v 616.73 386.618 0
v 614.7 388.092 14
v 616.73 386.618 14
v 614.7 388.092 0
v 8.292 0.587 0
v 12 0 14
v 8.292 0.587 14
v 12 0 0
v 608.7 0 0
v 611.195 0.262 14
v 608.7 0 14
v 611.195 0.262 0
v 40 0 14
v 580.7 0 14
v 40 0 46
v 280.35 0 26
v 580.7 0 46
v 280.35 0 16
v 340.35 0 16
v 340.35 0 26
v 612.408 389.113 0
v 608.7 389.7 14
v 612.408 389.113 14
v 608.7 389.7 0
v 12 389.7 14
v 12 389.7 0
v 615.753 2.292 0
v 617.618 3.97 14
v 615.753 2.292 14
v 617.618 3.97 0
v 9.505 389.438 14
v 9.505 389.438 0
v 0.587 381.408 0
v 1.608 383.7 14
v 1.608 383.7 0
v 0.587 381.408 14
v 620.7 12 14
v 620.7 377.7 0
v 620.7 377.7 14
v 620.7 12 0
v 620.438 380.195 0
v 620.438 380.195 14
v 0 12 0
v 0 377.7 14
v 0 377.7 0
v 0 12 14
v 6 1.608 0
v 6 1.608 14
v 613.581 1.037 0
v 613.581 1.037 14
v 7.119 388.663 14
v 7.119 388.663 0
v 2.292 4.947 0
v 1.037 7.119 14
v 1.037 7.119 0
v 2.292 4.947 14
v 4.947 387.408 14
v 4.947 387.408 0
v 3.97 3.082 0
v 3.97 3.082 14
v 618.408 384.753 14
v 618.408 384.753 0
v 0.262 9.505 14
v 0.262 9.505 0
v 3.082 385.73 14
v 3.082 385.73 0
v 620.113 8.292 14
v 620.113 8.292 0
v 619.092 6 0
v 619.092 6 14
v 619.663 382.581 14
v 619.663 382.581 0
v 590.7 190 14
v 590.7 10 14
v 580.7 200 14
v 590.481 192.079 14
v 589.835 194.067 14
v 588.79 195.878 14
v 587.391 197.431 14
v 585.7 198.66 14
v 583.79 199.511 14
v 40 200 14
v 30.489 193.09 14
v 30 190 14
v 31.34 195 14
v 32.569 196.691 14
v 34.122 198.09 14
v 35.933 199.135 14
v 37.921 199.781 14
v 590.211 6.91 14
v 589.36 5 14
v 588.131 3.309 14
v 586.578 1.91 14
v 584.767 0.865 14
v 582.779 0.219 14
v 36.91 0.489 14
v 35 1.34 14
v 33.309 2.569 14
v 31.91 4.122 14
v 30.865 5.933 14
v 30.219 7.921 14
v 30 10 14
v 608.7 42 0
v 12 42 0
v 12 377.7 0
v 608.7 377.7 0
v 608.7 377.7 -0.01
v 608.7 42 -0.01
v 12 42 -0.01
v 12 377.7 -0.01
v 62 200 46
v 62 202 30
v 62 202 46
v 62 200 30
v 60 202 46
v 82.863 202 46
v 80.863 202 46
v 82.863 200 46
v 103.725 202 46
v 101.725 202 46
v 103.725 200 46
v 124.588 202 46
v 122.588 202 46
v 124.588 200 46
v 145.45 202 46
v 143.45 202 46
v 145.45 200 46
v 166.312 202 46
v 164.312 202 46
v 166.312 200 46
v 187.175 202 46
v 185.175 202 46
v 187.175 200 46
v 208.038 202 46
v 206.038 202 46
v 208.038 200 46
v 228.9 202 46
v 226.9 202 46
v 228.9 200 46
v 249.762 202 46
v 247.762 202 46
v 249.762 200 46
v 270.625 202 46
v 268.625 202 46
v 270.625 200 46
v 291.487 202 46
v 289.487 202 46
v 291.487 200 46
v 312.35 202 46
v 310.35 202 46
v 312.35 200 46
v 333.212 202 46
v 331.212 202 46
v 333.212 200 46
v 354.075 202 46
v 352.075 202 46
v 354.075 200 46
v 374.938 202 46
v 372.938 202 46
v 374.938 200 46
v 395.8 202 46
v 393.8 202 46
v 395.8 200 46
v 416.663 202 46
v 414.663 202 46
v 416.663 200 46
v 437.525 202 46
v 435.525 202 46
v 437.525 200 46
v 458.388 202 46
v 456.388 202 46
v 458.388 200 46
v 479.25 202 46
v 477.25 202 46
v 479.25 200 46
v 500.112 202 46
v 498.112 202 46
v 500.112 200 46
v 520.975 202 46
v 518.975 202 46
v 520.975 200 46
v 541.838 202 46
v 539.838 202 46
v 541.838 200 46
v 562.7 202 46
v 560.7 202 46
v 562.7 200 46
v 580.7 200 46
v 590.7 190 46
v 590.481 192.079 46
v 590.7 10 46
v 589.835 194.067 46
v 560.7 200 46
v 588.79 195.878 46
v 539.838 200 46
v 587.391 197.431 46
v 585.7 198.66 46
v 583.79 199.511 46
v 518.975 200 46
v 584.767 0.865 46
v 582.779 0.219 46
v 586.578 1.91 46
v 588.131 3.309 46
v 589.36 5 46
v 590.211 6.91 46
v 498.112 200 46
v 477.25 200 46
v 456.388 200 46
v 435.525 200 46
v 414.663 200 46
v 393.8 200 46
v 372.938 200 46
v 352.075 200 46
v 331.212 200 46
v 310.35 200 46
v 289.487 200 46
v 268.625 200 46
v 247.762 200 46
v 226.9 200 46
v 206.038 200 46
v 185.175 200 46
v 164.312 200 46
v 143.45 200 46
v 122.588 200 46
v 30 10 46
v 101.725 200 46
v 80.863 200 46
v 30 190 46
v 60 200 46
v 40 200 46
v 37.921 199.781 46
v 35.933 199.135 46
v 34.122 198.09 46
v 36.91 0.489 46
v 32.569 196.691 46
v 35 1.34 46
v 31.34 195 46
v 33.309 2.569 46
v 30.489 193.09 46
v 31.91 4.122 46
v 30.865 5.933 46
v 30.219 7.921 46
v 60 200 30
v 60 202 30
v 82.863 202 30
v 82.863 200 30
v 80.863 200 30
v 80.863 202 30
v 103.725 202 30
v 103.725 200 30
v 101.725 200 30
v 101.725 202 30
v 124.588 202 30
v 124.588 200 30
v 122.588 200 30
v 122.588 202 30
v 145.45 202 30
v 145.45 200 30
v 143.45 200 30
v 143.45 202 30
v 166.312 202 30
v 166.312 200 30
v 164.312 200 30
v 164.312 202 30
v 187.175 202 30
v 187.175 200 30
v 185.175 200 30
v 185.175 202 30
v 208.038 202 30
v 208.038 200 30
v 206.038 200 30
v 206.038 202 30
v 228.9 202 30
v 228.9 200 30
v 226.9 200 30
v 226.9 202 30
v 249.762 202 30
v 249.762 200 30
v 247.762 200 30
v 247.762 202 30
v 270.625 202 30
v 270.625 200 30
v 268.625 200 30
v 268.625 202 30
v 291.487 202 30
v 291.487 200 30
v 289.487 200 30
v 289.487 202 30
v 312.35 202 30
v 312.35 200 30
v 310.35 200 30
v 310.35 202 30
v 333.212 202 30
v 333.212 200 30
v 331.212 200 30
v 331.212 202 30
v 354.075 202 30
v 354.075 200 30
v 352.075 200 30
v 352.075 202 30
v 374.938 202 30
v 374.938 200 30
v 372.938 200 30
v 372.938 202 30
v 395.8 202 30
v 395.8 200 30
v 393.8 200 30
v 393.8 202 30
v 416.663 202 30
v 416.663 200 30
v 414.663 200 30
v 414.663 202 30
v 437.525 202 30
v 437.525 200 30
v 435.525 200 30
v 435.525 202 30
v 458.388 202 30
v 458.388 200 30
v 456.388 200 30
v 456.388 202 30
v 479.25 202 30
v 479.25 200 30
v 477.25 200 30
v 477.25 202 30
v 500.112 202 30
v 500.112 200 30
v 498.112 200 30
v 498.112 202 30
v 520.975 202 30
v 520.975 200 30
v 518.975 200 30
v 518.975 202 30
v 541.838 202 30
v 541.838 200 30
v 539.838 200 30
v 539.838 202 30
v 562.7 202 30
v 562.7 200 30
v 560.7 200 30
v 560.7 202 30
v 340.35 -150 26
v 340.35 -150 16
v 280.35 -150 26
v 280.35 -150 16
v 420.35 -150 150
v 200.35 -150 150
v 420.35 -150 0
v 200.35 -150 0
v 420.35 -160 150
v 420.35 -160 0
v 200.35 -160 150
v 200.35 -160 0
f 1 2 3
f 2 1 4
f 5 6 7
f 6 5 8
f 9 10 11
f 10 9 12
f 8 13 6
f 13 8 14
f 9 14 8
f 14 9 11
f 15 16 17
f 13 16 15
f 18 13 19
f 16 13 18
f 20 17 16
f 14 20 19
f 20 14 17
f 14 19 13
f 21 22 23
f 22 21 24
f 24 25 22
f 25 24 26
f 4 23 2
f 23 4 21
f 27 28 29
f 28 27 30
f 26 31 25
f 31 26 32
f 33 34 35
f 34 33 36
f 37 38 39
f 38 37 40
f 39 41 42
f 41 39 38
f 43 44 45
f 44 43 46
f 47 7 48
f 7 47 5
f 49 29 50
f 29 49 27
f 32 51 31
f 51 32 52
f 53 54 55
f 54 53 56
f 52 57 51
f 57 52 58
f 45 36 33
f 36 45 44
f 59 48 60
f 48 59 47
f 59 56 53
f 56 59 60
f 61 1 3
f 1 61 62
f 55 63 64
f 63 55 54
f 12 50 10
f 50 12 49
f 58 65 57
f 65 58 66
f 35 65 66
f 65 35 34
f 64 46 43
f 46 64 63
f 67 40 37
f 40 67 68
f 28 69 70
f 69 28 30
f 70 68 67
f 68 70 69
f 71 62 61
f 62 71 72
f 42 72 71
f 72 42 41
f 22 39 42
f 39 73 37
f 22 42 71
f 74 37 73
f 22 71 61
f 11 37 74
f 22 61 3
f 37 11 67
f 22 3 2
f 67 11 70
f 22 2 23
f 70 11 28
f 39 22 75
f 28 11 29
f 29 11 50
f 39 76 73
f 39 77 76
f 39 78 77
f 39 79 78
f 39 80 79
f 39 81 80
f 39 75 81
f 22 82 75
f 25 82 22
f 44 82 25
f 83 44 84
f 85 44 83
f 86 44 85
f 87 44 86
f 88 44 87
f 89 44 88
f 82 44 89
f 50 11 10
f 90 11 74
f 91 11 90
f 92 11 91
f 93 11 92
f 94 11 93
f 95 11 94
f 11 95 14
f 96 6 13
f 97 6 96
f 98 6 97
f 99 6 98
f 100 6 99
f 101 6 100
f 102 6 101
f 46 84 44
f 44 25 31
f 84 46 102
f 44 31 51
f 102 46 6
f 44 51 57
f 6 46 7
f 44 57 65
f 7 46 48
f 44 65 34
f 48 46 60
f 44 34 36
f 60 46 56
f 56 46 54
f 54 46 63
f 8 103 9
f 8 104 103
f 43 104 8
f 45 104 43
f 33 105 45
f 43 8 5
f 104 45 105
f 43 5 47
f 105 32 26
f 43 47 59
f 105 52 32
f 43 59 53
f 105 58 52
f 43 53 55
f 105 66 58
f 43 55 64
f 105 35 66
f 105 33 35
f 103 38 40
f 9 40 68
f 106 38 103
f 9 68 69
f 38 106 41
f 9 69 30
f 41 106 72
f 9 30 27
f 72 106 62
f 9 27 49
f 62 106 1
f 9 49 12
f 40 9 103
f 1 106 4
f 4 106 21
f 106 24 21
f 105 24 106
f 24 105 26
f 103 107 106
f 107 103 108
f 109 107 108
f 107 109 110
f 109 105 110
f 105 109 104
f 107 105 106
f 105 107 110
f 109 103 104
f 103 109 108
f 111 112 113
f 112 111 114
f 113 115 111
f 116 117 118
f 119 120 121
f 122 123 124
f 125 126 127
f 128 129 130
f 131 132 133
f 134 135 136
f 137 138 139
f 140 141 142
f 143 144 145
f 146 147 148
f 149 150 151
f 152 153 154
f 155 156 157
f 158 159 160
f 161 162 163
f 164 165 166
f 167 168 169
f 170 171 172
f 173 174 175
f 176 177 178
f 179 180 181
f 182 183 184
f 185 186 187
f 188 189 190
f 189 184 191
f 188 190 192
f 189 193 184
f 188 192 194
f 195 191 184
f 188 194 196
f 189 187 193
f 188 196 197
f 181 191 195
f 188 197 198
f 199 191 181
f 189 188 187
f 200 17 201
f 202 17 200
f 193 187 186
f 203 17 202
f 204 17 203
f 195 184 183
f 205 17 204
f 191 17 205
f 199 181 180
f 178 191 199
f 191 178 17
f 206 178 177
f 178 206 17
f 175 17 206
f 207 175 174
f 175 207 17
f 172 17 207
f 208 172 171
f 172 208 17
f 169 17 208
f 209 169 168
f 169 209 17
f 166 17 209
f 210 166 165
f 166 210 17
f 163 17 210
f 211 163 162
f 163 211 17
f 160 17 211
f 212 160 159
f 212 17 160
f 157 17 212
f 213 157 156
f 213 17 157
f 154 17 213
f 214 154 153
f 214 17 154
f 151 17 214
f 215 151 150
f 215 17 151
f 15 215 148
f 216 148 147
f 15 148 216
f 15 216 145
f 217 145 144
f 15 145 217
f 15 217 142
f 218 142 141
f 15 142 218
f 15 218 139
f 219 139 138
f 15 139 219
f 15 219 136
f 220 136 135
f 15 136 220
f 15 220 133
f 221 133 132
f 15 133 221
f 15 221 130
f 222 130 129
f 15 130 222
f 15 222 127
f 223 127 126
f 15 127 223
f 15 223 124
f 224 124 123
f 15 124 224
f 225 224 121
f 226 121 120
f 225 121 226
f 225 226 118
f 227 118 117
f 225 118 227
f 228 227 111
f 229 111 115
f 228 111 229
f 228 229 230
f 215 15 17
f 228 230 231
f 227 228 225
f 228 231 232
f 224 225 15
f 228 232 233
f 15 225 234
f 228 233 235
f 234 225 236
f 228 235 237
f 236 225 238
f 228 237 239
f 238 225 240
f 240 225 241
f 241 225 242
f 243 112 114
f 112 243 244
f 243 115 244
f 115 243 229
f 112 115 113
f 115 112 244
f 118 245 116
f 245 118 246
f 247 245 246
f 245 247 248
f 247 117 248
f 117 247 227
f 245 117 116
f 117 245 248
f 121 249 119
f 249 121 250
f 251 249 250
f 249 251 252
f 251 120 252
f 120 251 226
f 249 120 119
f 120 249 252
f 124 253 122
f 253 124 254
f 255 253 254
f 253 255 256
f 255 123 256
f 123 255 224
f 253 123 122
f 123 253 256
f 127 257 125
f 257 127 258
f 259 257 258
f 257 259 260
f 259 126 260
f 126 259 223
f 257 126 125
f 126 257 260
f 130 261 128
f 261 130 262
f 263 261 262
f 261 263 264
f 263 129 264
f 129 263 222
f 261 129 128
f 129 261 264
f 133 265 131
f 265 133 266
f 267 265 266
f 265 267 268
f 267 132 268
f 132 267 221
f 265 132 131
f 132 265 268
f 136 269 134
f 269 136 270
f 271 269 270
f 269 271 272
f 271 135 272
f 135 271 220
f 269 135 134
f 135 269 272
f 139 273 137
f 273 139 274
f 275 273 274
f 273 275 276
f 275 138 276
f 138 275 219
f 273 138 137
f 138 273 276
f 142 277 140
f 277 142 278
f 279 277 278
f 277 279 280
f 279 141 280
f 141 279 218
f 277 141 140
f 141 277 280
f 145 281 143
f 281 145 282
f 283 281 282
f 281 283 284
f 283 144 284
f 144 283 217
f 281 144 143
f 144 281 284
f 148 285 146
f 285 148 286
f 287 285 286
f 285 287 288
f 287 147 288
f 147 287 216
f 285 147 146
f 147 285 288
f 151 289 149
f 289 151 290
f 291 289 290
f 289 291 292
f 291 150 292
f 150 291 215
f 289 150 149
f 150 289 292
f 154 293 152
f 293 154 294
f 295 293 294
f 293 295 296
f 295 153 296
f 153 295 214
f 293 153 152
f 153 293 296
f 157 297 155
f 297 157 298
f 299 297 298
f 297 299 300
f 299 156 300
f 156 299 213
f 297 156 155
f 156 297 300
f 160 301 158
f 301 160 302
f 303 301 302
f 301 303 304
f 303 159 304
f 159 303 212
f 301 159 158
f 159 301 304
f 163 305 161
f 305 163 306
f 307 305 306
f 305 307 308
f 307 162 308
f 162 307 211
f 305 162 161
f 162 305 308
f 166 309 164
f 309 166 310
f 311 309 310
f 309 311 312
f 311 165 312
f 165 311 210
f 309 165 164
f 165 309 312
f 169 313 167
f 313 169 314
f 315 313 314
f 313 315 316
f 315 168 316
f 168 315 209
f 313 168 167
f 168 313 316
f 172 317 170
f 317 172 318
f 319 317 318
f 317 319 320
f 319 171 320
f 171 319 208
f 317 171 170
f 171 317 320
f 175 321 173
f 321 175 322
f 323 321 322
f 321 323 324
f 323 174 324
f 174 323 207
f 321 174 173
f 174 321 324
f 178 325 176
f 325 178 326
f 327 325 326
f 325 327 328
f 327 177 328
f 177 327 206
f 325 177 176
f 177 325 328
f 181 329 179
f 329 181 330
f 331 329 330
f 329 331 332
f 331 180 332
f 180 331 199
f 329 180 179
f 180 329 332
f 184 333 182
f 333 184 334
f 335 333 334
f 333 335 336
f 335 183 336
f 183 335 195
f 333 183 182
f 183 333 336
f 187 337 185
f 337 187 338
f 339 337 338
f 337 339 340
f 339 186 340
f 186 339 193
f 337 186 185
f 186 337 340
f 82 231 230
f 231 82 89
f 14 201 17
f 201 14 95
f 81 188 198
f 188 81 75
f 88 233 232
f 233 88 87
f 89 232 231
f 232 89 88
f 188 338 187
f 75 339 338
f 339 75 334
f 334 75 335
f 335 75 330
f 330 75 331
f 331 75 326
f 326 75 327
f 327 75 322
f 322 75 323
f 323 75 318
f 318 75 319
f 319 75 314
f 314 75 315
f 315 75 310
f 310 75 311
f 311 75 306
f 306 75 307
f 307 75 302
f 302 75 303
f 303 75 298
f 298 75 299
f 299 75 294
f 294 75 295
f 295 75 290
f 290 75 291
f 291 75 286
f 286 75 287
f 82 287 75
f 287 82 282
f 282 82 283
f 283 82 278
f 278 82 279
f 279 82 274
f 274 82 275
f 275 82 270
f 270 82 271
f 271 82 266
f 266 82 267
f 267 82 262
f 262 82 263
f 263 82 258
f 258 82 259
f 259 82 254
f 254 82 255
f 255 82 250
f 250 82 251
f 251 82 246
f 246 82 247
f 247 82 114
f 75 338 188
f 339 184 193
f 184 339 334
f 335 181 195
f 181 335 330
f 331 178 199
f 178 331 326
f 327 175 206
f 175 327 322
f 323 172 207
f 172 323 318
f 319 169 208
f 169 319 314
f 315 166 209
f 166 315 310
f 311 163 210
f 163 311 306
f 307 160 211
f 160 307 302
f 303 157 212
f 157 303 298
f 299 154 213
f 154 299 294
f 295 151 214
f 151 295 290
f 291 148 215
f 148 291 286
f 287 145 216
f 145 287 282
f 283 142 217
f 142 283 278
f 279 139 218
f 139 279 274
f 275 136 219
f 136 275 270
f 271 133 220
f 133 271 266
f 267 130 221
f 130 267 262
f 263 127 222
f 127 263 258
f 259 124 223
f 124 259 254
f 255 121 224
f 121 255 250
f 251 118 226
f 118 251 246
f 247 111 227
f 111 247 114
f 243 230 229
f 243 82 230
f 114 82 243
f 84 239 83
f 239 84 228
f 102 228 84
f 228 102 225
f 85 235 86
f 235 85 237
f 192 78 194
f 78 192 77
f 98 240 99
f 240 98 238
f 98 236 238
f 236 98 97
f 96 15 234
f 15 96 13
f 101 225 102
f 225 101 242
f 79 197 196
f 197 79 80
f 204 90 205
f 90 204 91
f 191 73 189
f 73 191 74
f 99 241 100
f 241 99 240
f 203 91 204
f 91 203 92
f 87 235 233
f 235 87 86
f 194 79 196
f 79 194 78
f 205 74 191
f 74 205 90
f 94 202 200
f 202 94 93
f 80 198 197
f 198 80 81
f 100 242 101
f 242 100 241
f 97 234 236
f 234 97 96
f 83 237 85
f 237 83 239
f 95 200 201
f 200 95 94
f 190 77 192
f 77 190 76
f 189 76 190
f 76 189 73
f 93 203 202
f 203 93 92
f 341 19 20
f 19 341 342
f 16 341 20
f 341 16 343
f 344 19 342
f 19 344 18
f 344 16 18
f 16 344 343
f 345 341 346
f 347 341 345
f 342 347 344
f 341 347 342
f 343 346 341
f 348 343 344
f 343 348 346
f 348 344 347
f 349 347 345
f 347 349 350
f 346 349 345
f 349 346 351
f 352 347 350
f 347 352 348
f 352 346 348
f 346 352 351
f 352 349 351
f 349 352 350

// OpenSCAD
// iMac風 一体型ゲーミングPC 外観パラメトリックモデル (単位: mm)
// 注意: OpenSCAD未実行の初稿。寸法は docs/design.md の設計値に対応。
panel_w = 596.7;  panel_h = 335.7;   // 27" 16:9 有効表示領域
bezel   = 12;                         // 左右上ベゼル
chin    = 42;                         // 下部チン(iMac風)
body_t  = 14;                         // 前面スラブ厚(パネル+背面プレート)
pod_h   = 200; pod_t = 46;            // 背面下部サーマルポッド(深さ合計=pod_t)
corner  = 12;

W = panel_w + 2*bezel;
H = panel_h + bezel + chin;

module rrect(w,h,t,r){ linear_extrude(t) offset(r) offset(-r) square([w,h],center=false); }

module slab(){ // 前面スラブ(アルミ背面+ガラス前面)
  color("#d9dbde") rrect(W,H,body_t,corner);
  // ガラス/パネル面
  color("#0b0b0d") translate([bezel,chin,-0.01]) cube([panel_w,panel_h,0.5]);
}

module pod(){ // 背面サーマルポッド(下部): 吸気=下面スリット, 排気=上面スリット
  color("#c9ccd0") translate([30,0,body_t]) rrect(W-60,pod_h,pod_t-body_t,10);
  // 排気スリット
  for(i=[0:24]) color("#222") translate([60+i*(W-120)/24, pod_h-2, body_t+(pod_t-body_t)/2]) cube([2,4,(pod_t-body_t)/2],center=false);
}

module stand(){ // iMac 24風 一枚アーム
  color("#d9dbde") translate([W/2-30, -150, body_t+2]) cube([60,160,10]);
  color("#d9dbde") translate([W/2-110, -160, 0]) cube([220,10,150]);
}

slab(); pod(); stand();
